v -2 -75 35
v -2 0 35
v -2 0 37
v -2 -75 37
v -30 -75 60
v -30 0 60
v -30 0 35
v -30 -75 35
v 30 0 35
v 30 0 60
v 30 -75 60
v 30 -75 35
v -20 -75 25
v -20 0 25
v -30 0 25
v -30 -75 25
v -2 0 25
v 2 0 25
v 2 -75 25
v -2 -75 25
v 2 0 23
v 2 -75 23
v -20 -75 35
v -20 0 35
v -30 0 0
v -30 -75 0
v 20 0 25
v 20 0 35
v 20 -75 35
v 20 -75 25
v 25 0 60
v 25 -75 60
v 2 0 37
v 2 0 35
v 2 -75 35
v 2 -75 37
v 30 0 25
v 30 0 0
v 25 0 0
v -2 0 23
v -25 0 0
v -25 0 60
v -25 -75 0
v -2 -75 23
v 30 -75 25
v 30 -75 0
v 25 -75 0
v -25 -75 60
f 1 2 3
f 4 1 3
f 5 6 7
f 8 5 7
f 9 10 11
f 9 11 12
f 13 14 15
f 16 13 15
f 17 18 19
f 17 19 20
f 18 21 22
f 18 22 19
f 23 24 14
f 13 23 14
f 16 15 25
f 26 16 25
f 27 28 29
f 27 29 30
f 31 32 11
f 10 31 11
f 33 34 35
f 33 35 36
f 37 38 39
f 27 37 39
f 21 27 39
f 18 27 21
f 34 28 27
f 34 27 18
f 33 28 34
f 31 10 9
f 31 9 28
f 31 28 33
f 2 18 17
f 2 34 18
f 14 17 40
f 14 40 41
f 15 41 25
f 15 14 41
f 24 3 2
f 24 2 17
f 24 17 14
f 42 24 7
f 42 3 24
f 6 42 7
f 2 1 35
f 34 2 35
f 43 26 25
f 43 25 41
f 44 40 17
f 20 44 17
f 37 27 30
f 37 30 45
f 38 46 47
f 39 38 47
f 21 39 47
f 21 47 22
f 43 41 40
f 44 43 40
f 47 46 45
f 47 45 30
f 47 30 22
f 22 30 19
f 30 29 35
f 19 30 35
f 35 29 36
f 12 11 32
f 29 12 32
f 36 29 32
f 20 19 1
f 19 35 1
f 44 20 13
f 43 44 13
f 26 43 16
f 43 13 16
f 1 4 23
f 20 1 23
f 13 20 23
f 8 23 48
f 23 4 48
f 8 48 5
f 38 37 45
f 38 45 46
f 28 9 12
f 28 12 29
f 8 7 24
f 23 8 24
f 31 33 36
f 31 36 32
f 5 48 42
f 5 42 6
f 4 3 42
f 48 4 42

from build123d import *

# Parameters (mm, degrees)
F1_DEPTH = 75


with BuildPart() as f1:
    # F0 (on Front) → F1 (new body)
    with BuildSketch(Plane.XZ):
        Polygon((-30, 0), (-25, 0), (-2, 23), (-2, 25), (0, 25), (0, 35), (-2, 35), (-2, 37), (-25, 60), (-30, 60), (-30, 35), (-20, 35), (-20, 25), (-30, 25), align=None)
    extrude(amount=F1_DEPTH)

    # F2: F1 across face


with BuildPart() as f1_1:
    add(f1.part)
    add(f1.part.mirror(Plane(origin=(0, -37.5, 30), x_dir=(0, 1, 0), z_dir=(1, 0, 0))))


solid = f1_1.part
